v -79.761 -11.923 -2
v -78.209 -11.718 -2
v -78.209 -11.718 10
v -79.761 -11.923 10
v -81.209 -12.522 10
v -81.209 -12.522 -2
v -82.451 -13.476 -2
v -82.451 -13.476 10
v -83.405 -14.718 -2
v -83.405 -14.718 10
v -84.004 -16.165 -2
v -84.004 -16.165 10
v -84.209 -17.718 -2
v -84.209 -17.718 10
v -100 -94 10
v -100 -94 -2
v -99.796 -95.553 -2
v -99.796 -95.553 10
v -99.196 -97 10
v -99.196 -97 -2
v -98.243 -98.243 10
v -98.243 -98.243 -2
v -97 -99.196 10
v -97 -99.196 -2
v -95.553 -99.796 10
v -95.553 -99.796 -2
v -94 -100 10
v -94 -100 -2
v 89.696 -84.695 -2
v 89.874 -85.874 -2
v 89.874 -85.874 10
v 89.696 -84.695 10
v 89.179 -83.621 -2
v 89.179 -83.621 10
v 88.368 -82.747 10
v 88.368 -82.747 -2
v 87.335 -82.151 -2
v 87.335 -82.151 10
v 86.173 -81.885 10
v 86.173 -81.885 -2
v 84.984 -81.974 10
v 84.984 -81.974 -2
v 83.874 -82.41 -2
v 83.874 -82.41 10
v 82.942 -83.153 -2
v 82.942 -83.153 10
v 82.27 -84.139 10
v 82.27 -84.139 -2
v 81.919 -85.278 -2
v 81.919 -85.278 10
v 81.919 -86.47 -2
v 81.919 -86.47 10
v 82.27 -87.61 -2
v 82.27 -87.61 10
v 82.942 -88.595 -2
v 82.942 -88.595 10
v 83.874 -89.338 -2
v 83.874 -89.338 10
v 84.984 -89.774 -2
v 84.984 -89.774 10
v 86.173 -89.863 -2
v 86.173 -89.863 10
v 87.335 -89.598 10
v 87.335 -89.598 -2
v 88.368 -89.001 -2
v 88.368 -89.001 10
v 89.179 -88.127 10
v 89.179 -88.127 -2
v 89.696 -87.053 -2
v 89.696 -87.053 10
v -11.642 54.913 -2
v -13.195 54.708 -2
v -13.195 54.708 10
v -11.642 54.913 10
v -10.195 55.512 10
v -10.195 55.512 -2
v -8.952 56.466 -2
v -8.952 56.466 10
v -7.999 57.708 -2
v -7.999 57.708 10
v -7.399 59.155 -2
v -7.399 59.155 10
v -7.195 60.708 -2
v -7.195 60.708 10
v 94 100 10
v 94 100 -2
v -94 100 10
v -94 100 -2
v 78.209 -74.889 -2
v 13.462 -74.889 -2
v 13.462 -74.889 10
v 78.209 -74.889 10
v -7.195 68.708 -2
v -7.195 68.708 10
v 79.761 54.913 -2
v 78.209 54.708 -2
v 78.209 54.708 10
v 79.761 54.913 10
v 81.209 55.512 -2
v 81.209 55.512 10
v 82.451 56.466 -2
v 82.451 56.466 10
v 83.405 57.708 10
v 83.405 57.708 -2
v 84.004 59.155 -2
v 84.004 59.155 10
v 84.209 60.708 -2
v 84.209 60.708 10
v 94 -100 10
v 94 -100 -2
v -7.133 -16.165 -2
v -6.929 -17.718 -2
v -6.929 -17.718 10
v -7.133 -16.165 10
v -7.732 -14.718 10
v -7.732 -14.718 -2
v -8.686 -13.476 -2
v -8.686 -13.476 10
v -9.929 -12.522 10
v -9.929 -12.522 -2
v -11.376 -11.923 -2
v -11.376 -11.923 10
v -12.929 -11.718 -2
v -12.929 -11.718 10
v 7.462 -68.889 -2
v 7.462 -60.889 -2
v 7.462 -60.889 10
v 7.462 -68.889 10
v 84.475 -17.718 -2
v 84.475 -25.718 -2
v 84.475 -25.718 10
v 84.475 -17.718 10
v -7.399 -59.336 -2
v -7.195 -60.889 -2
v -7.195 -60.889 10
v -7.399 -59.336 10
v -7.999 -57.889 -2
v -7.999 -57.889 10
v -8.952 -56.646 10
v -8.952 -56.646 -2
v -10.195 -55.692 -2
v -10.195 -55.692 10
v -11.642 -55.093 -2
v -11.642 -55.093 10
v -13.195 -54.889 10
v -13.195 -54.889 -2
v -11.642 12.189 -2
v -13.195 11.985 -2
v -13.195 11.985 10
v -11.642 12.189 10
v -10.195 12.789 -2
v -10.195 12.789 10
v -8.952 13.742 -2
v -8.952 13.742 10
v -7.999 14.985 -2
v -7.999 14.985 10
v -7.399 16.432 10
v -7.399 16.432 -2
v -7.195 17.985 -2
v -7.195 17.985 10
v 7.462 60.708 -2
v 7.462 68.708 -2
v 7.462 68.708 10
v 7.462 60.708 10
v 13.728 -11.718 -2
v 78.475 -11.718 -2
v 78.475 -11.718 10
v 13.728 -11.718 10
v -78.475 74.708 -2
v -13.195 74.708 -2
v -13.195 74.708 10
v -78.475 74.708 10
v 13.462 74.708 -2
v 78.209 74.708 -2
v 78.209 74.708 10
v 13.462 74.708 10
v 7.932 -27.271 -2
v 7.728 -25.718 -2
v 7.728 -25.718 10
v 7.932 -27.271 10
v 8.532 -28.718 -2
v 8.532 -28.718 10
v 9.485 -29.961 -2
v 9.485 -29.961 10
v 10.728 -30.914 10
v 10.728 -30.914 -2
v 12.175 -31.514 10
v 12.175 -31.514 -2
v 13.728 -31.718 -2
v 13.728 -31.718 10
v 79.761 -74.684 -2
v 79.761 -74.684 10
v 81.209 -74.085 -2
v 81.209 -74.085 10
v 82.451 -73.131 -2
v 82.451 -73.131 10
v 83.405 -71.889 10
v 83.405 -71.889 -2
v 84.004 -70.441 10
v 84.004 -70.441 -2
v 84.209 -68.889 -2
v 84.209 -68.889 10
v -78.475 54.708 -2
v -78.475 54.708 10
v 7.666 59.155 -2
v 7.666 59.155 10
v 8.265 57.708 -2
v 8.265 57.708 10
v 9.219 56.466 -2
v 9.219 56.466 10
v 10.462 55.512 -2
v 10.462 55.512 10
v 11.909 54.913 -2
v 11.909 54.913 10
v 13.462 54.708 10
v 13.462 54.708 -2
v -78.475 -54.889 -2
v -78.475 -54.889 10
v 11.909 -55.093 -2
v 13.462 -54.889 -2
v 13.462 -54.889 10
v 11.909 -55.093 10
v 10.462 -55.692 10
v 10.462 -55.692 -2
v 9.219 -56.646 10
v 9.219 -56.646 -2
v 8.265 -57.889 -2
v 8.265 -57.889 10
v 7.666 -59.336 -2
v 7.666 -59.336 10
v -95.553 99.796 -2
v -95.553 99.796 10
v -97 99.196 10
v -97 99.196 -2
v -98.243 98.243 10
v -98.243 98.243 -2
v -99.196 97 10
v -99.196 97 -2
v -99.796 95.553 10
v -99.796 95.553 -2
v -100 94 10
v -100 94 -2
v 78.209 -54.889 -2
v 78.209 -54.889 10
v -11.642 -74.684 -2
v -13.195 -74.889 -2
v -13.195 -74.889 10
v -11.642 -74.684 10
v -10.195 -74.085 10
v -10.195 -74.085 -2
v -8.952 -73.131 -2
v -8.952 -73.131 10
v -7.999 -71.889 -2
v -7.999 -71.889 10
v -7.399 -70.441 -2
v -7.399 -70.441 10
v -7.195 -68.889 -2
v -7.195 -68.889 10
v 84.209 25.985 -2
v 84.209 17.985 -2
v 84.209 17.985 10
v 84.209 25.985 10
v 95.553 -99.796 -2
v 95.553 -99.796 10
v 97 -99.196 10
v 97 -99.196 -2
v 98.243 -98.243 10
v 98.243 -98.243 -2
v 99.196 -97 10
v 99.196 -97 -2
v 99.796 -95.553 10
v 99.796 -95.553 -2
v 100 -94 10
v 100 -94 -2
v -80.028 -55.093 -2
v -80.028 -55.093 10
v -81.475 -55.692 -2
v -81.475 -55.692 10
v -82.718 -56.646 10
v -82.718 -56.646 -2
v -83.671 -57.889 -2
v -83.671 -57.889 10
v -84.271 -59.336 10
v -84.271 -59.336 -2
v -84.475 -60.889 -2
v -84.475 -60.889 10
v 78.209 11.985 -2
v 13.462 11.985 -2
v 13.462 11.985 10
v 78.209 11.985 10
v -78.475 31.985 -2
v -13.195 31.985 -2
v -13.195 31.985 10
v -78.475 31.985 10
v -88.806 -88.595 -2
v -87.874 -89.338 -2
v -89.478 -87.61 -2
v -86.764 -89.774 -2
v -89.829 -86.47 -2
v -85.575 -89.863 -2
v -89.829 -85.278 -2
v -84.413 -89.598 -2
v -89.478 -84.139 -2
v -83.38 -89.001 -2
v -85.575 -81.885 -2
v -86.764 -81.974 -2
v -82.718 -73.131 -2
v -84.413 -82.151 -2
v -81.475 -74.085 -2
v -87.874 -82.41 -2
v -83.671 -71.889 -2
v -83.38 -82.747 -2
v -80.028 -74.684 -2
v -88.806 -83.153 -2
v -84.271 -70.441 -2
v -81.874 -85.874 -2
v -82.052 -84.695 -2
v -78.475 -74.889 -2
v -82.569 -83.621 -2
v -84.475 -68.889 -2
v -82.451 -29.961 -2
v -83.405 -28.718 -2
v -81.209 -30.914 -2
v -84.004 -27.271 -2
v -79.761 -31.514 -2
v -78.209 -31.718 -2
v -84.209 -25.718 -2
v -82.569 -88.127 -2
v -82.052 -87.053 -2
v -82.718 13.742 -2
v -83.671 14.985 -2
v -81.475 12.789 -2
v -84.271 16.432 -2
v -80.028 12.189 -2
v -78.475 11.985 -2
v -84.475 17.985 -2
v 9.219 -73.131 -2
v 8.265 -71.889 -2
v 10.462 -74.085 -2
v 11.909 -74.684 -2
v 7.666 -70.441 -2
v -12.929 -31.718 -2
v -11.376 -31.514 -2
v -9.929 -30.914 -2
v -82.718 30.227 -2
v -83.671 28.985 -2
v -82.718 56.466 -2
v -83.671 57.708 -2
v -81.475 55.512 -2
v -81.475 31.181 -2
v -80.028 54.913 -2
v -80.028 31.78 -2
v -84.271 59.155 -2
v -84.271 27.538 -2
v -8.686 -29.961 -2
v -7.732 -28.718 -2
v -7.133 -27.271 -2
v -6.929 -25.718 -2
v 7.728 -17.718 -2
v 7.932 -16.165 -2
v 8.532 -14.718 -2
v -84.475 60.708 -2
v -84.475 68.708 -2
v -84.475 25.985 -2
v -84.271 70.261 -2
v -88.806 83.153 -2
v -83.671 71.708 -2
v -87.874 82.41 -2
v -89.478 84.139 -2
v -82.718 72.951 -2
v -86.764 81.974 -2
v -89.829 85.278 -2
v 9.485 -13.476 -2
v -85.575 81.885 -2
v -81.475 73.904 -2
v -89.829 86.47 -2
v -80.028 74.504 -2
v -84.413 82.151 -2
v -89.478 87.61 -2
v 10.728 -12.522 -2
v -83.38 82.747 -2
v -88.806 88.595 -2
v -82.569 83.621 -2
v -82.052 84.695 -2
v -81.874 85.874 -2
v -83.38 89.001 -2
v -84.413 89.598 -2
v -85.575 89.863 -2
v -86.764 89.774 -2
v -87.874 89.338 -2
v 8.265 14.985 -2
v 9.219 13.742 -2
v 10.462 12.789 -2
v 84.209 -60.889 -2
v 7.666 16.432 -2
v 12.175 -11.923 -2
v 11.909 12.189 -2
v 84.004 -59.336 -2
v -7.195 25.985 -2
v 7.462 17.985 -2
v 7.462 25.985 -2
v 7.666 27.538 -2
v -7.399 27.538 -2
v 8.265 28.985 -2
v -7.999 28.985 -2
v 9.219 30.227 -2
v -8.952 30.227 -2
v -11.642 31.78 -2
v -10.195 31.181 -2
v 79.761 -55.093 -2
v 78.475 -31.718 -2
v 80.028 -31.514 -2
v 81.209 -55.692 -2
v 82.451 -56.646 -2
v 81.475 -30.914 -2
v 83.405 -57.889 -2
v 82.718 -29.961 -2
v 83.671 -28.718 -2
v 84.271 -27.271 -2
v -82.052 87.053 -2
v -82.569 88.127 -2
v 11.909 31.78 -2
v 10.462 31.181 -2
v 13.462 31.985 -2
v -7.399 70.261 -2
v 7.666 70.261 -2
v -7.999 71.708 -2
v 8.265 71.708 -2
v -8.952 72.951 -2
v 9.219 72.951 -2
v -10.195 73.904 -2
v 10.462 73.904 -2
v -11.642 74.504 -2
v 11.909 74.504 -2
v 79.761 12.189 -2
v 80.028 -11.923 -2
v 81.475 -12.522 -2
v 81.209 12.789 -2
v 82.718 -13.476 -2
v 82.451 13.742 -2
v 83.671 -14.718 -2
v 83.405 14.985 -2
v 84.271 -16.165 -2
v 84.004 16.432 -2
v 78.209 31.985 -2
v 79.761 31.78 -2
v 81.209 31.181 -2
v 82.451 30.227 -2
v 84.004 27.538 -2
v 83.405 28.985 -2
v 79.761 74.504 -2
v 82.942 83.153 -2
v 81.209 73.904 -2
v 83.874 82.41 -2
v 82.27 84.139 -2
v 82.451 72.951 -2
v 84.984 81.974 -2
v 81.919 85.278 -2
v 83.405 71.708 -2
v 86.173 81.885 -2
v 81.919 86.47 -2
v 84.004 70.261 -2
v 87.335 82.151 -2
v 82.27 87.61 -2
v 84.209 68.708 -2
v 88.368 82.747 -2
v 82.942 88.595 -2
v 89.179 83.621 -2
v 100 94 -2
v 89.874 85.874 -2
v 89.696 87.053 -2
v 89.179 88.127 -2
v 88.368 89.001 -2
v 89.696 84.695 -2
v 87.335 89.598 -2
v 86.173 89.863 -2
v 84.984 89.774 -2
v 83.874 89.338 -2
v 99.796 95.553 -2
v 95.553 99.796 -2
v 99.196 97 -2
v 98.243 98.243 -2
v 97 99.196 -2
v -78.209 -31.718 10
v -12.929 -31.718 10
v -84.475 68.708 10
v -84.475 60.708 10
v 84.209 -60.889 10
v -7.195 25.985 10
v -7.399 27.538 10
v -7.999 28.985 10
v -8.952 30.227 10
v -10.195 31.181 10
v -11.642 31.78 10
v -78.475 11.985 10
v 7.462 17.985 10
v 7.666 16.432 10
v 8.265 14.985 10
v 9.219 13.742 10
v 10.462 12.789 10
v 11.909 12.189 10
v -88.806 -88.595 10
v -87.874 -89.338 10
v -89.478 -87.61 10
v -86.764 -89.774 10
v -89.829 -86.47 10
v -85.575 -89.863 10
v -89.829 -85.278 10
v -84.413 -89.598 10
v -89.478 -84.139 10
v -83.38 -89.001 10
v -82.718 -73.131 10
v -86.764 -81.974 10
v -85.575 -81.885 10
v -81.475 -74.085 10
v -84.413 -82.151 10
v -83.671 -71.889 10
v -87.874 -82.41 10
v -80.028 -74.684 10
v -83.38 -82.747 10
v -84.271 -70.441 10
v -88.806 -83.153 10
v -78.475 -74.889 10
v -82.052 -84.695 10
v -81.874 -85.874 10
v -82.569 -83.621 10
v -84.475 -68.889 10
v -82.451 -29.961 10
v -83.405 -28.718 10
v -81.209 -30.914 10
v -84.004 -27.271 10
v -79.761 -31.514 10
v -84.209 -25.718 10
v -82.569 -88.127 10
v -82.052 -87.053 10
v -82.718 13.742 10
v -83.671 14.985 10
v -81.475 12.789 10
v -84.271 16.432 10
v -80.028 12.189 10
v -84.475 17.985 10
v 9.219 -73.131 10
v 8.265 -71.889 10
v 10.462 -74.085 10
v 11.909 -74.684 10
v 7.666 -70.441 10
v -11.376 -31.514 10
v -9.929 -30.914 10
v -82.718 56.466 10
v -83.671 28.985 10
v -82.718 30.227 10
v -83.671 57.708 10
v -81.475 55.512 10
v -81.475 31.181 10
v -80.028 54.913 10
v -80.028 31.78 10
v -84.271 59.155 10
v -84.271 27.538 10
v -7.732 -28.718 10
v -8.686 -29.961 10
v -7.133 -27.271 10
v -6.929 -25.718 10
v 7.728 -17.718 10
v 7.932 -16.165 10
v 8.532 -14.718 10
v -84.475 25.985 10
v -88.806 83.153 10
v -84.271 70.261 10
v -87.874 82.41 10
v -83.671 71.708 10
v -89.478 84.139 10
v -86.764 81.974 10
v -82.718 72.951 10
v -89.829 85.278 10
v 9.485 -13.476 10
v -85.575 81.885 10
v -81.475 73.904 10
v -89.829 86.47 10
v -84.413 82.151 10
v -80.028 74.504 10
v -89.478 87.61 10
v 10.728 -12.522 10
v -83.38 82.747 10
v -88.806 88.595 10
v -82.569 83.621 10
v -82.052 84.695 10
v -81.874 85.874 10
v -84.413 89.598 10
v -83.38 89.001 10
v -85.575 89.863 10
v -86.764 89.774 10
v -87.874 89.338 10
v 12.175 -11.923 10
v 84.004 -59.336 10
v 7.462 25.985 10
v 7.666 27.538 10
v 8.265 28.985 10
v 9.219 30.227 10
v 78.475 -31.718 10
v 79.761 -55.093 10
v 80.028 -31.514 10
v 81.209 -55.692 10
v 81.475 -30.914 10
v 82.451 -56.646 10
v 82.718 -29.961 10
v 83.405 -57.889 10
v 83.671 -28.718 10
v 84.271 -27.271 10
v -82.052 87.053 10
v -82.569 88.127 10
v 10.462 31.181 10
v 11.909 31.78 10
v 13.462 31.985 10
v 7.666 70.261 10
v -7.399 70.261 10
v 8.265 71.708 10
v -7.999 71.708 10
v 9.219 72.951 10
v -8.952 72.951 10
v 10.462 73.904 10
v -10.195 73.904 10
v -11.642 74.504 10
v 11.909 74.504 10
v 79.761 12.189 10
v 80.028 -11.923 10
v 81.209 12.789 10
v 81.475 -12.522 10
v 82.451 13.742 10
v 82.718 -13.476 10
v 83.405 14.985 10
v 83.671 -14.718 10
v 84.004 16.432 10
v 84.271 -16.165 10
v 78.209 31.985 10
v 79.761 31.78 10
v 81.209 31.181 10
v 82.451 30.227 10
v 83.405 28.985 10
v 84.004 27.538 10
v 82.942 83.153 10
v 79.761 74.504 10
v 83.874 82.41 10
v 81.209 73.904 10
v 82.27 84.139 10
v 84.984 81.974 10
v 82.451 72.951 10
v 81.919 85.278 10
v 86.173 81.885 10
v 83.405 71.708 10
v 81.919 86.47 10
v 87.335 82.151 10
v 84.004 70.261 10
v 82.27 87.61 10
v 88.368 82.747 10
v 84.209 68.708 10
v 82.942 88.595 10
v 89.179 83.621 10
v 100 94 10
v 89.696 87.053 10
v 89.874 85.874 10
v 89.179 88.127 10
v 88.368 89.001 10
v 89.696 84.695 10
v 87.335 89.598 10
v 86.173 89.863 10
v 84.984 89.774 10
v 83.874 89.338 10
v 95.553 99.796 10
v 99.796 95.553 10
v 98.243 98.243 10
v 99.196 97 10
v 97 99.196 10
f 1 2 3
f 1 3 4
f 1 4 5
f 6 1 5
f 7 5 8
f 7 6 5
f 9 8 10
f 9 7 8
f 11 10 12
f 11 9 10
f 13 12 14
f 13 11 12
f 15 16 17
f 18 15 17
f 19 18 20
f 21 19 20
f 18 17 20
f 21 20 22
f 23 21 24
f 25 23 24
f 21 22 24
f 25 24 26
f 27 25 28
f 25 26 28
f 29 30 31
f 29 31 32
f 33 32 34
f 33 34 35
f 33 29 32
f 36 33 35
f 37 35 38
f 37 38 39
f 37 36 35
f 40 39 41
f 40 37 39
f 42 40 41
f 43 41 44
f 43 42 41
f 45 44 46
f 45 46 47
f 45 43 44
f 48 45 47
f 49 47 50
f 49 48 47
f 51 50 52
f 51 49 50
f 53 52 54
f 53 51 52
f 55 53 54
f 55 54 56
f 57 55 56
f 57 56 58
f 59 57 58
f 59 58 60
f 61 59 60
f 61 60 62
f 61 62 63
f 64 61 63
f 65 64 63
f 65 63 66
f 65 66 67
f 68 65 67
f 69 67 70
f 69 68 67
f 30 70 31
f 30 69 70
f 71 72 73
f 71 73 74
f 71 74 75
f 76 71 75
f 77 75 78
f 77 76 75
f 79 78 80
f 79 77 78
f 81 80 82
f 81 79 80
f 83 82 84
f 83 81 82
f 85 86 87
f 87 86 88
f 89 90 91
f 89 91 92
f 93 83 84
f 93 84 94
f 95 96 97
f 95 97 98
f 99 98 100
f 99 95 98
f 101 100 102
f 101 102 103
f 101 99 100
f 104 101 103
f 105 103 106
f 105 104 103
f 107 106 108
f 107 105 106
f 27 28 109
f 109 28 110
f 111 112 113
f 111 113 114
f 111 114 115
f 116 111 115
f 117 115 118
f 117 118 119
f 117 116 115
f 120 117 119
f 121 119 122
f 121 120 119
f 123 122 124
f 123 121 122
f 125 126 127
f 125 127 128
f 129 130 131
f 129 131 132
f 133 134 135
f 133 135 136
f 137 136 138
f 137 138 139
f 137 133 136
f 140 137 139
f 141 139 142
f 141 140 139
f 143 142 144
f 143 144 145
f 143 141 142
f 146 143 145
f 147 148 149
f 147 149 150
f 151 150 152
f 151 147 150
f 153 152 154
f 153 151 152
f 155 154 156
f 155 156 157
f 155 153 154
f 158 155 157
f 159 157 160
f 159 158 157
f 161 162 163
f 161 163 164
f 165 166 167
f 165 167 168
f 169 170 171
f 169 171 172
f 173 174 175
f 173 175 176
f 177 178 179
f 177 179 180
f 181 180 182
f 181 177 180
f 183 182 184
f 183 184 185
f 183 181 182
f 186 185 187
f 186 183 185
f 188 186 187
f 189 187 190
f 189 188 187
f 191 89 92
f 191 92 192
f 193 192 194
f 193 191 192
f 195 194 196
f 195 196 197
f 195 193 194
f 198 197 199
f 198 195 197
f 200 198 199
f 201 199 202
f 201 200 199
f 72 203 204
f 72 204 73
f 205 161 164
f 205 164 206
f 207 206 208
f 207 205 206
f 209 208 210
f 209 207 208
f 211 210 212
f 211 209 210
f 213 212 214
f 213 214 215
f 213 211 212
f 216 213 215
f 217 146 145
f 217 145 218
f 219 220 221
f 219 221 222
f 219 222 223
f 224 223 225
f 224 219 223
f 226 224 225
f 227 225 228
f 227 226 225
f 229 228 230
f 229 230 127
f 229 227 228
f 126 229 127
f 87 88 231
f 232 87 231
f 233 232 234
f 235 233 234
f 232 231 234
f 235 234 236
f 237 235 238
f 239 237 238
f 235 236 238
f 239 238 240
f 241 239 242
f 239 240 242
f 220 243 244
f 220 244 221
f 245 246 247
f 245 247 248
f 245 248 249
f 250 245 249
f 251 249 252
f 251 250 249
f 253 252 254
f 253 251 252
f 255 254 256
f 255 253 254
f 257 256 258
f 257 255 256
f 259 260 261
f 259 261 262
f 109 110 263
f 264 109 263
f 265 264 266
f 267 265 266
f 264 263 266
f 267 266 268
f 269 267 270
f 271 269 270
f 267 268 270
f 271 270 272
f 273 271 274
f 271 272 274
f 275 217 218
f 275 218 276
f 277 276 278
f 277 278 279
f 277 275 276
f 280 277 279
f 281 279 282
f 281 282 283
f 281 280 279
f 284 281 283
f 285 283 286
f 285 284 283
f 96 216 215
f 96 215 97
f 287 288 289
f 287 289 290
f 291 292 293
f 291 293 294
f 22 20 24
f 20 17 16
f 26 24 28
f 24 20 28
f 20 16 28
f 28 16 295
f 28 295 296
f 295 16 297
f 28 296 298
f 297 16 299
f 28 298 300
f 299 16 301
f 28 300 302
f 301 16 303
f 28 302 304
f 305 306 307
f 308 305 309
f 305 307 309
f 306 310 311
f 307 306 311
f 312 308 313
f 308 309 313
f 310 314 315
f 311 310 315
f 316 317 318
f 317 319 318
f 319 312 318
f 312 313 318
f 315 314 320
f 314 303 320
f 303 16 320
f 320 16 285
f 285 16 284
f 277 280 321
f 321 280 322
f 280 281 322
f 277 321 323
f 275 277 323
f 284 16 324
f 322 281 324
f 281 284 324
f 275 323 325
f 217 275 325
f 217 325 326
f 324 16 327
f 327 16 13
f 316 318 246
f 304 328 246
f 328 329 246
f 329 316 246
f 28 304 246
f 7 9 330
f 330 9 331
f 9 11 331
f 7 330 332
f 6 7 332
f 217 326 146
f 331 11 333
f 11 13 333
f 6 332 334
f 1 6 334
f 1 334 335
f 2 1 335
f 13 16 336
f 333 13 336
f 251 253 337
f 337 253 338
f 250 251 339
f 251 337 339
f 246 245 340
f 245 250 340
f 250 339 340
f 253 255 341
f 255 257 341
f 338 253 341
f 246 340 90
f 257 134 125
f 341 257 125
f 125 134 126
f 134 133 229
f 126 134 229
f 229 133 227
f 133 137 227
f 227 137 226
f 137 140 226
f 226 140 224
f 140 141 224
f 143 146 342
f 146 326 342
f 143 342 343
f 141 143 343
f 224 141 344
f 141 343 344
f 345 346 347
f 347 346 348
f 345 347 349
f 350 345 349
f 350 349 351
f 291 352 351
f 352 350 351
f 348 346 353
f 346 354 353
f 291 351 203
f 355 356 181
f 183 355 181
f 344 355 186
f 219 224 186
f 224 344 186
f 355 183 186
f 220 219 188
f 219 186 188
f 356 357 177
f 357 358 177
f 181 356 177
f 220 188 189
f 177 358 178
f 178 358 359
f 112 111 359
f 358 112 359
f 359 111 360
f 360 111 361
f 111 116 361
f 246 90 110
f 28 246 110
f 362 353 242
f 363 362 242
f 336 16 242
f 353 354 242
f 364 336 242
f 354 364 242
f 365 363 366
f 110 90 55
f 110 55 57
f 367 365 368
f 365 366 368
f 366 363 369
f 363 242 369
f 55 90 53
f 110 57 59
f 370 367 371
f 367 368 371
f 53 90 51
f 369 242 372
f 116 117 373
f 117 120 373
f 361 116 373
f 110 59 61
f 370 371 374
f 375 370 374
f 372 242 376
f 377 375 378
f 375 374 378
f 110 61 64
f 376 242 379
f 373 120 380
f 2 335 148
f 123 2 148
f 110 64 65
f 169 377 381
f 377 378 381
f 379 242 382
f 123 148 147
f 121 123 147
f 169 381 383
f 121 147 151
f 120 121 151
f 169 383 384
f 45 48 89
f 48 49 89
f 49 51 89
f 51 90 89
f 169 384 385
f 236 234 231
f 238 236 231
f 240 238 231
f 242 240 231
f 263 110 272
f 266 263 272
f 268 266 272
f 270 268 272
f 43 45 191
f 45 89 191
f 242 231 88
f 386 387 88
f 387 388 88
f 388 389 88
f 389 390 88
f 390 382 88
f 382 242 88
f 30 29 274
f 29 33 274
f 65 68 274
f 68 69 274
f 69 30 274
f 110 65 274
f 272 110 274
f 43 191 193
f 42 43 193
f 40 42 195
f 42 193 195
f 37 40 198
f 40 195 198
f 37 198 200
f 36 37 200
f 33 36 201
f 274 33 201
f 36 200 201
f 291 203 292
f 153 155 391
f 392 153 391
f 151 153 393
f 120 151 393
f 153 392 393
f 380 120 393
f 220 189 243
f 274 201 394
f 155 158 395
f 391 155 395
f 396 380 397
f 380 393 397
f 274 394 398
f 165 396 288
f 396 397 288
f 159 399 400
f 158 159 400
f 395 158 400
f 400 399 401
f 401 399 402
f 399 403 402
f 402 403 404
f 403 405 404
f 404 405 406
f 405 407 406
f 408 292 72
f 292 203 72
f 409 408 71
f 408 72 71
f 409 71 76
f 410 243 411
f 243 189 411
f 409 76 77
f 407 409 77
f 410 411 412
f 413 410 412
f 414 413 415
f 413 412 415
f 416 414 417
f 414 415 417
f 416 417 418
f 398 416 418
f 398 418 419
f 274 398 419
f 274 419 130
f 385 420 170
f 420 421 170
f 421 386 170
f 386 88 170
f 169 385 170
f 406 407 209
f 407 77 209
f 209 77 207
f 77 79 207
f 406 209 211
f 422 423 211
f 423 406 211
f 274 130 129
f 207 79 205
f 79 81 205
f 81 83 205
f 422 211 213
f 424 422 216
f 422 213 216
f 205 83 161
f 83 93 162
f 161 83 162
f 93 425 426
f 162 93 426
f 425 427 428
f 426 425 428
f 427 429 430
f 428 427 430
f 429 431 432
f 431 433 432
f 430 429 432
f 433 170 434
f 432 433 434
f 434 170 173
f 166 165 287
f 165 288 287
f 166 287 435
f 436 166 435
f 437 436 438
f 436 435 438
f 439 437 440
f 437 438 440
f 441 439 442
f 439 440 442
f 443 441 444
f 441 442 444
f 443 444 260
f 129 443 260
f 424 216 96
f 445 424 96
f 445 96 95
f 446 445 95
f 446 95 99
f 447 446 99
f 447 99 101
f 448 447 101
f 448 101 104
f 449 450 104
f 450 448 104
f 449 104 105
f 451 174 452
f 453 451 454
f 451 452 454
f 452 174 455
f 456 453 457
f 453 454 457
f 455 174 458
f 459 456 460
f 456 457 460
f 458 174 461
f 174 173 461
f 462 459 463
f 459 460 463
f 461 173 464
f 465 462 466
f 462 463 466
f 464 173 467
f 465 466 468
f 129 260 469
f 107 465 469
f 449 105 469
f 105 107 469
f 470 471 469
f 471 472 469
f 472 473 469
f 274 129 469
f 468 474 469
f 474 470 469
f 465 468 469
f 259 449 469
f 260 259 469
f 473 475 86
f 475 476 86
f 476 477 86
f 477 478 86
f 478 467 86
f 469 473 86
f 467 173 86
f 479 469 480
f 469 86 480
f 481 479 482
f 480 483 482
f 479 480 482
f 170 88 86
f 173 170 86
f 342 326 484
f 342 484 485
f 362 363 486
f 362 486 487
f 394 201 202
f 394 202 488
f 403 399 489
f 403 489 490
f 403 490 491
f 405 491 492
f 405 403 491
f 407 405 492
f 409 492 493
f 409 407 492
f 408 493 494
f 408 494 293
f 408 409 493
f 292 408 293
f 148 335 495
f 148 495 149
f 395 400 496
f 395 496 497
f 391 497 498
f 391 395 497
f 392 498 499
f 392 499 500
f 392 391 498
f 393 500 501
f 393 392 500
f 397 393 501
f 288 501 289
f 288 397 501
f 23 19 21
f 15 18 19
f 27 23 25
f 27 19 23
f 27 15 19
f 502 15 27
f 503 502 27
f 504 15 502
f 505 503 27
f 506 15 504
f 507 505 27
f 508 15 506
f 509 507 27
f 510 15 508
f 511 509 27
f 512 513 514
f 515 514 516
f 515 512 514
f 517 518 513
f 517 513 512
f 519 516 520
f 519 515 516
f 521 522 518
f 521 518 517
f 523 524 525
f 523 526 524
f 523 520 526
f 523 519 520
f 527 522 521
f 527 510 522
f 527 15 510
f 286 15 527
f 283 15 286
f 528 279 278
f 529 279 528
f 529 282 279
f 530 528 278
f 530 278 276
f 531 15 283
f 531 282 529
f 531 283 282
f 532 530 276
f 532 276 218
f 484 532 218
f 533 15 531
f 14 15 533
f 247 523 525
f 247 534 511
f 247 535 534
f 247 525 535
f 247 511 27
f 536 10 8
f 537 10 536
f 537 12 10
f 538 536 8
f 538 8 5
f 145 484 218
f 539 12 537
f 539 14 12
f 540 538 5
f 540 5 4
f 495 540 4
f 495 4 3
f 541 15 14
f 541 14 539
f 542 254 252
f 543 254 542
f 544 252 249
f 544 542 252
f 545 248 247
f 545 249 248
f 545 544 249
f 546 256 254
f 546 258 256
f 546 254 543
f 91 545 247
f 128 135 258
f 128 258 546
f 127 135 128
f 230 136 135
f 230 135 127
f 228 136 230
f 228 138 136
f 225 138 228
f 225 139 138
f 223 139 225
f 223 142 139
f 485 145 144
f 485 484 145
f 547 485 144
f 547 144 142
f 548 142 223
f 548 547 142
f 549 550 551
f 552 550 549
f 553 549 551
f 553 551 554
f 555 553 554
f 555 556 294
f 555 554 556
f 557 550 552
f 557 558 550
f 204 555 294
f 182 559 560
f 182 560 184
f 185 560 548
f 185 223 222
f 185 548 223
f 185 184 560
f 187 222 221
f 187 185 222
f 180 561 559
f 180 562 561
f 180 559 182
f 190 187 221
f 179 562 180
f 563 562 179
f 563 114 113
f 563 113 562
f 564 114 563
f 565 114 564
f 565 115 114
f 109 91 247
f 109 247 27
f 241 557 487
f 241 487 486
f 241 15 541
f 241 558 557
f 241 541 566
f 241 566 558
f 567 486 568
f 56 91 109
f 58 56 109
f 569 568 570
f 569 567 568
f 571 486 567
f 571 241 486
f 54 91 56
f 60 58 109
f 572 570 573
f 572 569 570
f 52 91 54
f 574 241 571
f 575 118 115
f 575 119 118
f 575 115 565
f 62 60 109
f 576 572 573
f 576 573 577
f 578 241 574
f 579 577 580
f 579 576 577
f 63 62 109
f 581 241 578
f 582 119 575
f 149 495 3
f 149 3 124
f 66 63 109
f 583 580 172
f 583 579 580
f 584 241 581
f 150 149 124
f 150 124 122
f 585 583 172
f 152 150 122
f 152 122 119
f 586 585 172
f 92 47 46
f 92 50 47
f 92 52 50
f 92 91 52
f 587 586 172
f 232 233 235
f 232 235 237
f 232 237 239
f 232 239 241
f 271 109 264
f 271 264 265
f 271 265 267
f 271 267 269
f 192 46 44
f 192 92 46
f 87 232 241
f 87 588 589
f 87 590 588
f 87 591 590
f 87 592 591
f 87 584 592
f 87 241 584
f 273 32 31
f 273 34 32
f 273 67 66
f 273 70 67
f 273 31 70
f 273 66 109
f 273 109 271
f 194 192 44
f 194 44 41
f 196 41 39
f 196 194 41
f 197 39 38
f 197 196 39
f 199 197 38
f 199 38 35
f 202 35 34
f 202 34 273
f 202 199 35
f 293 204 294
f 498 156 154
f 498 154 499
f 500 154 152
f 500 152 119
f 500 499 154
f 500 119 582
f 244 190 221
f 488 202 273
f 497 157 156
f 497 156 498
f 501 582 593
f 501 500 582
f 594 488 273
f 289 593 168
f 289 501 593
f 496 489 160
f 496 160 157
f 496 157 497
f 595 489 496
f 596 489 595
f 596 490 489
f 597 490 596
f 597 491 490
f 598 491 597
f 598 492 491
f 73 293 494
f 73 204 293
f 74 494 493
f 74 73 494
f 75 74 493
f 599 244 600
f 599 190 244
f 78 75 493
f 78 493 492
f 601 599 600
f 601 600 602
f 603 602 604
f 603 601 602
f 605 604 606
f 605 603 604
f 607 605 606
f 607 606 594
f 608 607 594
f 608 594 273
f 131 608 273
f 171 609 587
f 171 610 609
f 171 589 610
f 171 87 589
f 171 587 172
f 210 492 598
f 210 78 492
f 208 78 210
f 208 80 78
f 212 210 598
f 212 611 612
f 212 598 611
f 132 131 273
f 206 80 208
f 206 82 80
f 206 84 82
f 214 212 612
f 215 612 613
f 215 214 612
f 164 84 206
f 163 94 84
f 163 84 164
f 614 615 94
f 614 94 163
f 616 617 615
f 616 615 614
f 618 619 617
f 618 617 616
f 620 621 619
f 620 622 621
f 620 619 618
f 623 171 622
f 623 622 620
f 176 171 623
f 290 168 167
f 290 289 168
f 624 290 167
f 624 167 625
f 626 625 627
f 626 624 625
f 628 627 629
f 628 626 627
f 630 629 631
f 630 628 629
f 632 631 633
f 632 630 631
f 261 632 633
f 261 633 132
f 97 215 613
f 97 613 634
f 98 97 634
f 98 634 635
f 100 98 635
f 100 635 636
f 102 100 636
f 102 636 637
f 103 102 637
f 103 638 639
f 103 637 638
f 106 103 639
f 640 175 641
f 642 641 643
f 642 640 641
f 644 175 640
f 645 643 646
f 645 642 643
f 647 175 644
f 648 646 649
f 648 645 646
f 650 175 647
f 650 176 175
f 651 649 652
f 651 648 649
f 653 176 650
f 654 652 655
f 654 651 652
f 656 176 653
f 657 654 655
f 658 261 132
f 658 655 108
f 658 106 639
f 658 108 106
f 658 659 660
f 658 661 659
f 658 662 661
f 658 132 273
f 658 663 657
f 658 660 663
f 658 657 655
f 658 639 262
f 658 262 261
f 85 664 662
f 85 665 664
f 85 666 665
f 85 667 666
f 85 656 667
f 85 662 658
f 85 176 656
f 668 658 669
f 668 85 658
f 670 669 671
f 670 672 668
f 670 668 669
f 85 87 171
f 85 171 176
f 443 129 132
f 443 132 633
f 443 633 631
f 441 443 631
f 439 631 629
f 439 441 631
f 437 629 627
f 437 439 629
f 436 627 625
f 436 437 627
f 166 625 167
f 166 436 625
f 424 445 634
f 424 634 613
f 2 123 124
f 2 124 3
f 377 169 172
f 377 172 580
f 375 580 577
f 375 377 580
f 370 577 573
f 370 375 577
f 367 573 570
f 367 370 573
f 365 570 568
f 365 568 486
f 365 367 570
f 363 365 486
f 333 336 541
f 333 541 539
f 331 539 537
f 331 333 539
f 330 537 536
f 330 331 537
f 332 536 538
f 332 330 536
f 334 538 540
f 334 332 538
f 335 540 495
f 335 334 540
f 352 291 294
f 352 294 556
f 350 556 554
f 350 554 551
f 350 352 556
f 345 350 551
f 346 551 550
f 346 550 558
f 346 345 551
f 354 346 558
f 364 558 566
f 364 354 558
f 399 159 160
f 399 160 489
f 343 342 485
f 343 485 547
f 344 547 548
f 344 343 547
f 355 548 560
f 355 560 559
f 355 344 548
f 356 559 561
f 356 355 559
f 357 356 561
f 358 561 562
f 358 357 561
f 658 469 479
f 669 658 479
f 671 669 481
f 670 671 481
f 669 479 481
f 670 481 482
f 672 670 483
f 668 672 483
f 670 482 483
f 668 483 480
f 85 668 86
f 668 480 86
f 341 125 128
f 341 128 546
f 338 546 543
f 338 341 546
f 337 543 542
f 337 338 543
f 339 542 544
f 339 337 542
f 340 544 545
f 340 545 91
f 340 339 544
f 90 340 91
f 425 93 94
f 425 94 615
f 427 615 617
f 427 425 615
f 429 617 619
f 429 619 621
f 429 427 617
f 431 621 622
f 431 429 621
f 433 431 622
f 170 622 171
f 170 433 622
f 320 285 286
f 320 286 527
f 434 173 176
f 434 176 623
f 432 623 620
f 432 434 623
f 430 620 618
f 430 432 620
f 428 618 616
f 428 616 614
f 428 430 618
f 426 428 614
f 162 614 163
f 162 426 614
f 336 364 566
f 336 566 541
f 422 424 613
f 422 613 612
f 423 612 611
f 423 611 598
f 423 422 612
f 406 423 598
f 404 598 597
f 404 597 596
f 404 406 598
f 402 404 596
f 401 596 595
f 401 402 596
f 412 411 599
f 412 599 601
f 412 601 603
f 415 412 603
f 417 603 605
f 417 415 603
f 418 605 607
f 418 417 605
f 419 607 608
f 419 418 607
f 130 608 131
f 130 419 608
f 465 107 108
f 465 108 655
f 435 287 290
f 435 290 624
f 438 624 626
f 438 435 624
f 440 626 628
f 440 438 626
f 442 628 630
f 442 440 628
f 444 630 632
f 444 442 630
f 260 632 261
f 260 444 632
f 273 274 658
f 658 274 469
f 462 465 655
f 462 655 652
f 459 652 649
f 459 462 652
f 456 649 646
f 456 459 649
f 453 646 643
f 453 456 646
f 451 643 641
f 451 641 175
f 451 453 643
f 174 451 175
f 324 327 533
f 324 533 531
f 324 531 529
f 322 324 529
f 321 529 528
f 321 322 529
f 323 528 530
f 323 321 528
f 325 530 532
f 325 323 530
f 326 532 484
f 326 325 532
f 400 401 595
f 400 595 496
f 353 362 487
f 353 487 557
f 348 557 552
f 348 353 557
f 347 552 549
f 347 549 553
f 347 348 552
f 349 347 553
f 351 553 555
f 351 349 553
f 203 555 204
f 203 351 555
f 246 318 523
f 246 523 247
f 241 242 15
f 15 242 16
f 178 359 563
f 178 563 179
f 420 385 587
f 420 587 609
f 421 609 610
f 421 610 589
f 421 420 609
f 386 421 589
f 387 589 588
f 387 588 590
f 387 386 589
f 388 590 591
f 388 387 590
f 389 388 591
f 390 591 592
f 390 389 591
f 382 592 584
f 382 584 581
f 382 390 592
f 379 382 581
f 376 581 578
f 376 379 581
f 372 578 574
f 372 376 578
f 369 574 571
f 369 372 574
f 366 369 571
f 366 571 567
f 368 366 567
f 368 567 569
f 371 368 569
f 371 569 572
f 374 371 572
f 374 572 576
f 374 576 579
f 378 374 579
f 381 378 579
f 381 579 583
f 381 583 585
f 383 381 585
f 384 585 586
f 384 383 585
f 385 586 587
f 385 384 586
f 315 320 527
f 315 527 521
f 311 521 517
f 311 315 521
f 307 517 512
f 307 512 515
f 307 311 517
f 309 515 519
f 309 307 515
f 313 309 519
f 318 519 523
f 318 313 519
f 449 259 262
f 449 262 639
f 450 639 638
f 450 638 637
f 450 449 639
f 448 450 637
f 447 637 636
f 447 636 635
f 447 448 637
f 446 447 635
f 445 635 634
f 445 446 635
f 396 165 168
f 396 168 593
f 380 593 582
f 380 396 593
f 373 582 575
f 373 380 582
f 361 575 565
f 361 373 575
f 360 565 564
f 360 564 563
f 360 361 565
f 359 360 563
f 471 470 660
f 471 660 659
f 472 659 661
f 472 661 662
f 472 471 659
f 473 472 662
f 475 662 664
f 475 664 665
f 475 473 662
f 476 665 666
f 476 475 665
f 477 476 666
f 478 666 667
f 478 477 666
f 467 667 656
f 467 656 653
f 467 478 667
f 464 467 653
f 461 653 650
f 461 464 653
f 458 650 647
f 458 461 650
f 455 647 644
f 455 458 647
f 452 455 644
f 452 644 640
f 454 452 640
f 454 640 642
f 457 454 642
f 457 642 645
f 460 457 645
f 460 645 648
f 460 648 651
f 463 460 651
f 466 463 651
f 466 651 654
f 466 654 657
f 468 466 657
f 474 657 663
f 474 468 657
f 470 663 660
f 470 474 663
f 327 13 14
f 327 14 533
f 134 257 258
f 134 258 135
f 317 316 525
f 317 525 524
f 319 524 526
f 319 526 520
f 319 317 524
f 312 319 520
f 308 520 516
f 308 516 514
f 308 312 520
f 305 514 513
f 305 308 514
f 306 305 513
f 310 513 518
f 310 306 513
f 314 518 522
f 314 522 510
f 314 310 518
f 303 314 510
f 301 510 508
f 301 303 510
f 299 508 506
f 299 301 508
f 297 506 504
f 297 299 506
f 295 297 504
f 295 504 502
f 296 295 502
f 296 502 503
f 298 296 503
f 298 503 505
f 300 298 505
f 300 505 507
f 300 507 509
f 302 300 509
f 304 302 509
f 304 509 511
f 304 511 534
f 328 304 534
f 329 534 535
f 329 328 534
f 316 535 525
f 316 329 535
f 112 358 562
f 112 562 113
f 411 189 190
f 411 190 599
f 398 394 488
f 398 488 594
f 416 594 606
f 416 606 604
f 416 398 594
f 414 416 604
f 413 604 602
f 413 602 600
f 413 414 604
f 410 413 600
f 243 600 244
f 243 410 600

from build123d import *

# Parameters (mm, degrees)
SALIENTE_EXTRUIR2_DEPTH      = 10
SALIENTE_EXTRUIR2_DEPTH_BACK = 2
CROQUIS1_R                   = 4


with BuildPart() as part:
    # Croquis1 → Saliente-Extruir2 (new, two sides: drawn at the far end of the back side and taken through both)
    with BuildSketch(Plane.XY.offset(-SALIENTE_EXTRUIR2_DEPTH_BACK)):
        with BuildLine():
            Line((-94, -100), (94, -100))
            ThreePointArc((94, -100), (98.242640687, -98.242640687), (100, -94))
            Line((100, -94), (100, 94))
            ThreePointArc((100, 94), (98.242640687, 98.242640687), (94, 100))
            Line((94, 100), (-94, 100))
            ThreePointArc((-94, 100), (-98.242640687, 98.242640687), (-100, 94))
            Line((-100, 94), (-100, -94))
            ThreePointArc((-100, -94), (-98.242640687, -98.242640687), (-94, -100))
        make_face()
        with Locations((-85.874076582, 85.874076582)):
            Circle(CROQUIS1_R, mode=Mode.SUBTRACT)
        with Locations((85.874076582, 85.874076582)):
            Circle(CROQUIS1_R, mode=Mode.SUBTRACT)
        with Locations((85.874076582, -85.874076582)):
            Circle(CROQUIS1_R, mode=Mode.SUBTRACT)
        with Locations((-85.874076582, -85.874076582)):
            Circle(CROQUIS1_R, mode=Mode.SUBTRACT)
        with BuildLine():
            Line((-78.475041975, 54.708172492), (-13.195035121, 54.708172492))
            ThreePointArc((-13.195035121, 54.708172492), (-8.952394434, 56.465531805), (-7.195035121, 60.708172492))
            Line((-7.195035121, 60.708172492), (-7.195035121, 68.708172492))
            ThreePointArc((-7.195035121, 68.708172492), (-8.952394434, 72.95081318), (-13.195035121, 74.708172492))
            Line((-13.195035121, 74.708172492), (-78.475041975, 74.708172492))
            ThreePointArc((-78.475041975, 74.708172492), (-82.717682662, 72.95081318), (-84.475041975, 68.708172492))
            Line((-84.475041975, 68.708172492), (-84.475041975, 60.708172492))
            ThreePointArc((-84.475041975, 60.708172492), (-82.717682662, 56.465531805), (-78.475041975, 54.708172492))
        make_face(mode=Mode.SUBTRACT)
        with BuildLine():
            Line((-78.475041975, 11.984829536), (-13.195035121, 11.984829536))
            ThreePointArc((-13.195035121, 11.984829536), (-8.952394434, 13.742188849), (-7.195035121, 17.984829536))
            Line((-7.195035121, 17.984829536), (-7.195035121, 25.984829536))
            ThreePointArc((-7.195035121, 25.984829536), (-8.952394434, 30.227470223), (-13.195035121, 31.984829536))
            Line((-13.195035121, 31.984829536), (-78.475041975, 31.984829536))
            ThreePointArc((-78.475041975, 31.984829536), (-82.717682662, 30.227470223), (-84.475041975, 25.984829536))
            Line((-84.475041975, 25.984829536), (-84.475041975, 17.984829536))
            ThreePointArc((-84.475041975, 17.984829536), (-82.717682662, 13.742188849), (-78.475041975, 11.984829536))
        make_face(mode=Mode.SUBTRACT)
        with BuildLine():
            Line((-78.208559193, -31.718346754), (-12.928552339, -31.718346754))
            ThreePointArc((-12.928552339, -31.718346754), (-8.685911652, -29.960987441), (-6.928552339, -25.718346754))
            Line((-6.928552339, -25.718346754), (-6.928552339, -17.718346754))
            ThreePointArc((-6.928552339, -17.718346754), (-8.685911652, -13.475706067), (-12.928552339, -11.718346754))
            Line((-12.928552339, -11.718346754), (-78.208559193, -11.718346754))
            ThreePointArc((-78.208559193, -11.718346754), (-82.45119988, -13.475706067), (-84.208559193, -17.718346754))
            Line((-84.208559193, -17.718346754), (-84.208559193, -25.718346754))
            ThreePointArc((-84.208559193, -25.718346754), (-82.45119988, -29.960987441), (-78.208559193, -31.718346754))
        make_face(mode=Mode.SUBTRACT)
        with BuildLine():
            Line((-78.475041975, -74.888557479), (-13.195035121, -74.888557479))
            ThreePointArc((-13.195035121, -74.888557479), (-8.952394434, -73.131198166), (-7.195035121, -68.888557479))
            Line((-7.195035121, -68.888557479), (-7.195035121, -60.888557479))
            ThreePointArc((-7.195035121, -60.888557479), (-8.952394434, -56.645916792), (-13.195035121, -54.888557479))
            Line((-13.195035121, -54.888557479), (-78.475041975, -54.888557479))
            ThreePointArc((-78.475041975, -54.888557479), (-82.717682662, -56.645916792), (-84.475041975, -60.888557479))
            Line((-84.475041975, -60.888557479), (-84.475041975, -68.888557479))
            ThreePointArc((-84.475041975, -68.888557479), (-82.717682662, -73.131198166), (-78.475041975, -74.888557479))
        make_face(mode=Mode.SUBTRACT)
        with BuildLine():
            Line((13.461517903, 11.984829536), (78.208559193, 11.984829536))
            ThreePointArc((78.208559193, 11.984829536), (82.45119988, 13.742188849), (84.208559193, 17.984829536))
            Line((84.208559193, 17.984829536), (84.208559193, 25.984829536))
            ThreePointArc((84.208559193, 25.984829536), (82.45119988, 30.227470223), (78.208559193, 31.984829536))
            Line((78.208559193, 31.984829536), (13.461517903, 31.984829536))
            ThreePointArc((13.461517903, 31.984829536), (9.218877216, 30.227470223), (7.461517903, 25.984829536))
            Line((7.461517903, 25.984829536), (7.461517903, 17.984829536))
            ThreePointArc((7.461517903, 17.984829536), (9.218877216, 13.742188849), (13.461517903, 11.984829536))
        make_face(mode=Mode.SUBTRACT)
        with BuildLine():
            Line((13.461517903, 54.708172492), (78.208559193, 54.708172492))
            ThreePointArc((78.208559193, 54.708172492), (82.45119988, 56.465531805), (84.208559193, 60.708172492))
            Line((84.208559193, 60.708172492), (84.208559193, 68.708172492))
            ThreePointArc((84.208559193, 68.708172492), (82.45119988, 72.95081318), (78.208559193, 74.708172492))
            Line((78.208559193, 74.708172492), (13.461517903, 74.708172492))
            ThreePointArc((13.461517903, 74.708172492), (9.218877216, 72.95081318), (7.461517903, 68.708172492))
            Line((7.461517903, 68.708172492), (7.461517903, 60.708172492))
            ThreePointArc((7.461517903, 60.708172492), (9.218877216, 56.465531805), (13.461517903, 54.708172492))
        make_face(mode=Mode.SUBTRACT)
        with BuildLine():
            Line((13.728000685, -31.718346754), (78.475041975, -31.718346754))
            ThreePointArc((78.475041975, -31.718346754), (82.717682662, -29.960987441), (84.475041975, -25.718346754))
            Line((84.475041975, -25.718346754), (84.475041975, -17.718346754))
            ThreePointArc((84.475041975, -17.718346754), (82.717682662, -13.475706067), (78.475041975, -11.718346754))
            Line((78.475041975, -11.718346754), (13.728000685, -11.718346754))
            ThreePointArc((13.728000685, -11.718346754), (9.485359998, -13.475706067), (7.728000685, -17.718346754))
            Line((7.728000685, -17.718346754), (7.728000685, -25.718346754))
            ThreePointArc((7.728000685, -25.718346754), (9.485359998, -29.960987441), (13.728000685, -31.718346754))
        make_face(mode=Mode.SUBTRACT)
        with BuildLine():
            Line((13.461517903, -74.888557479), (78.208559193, -74.888557479))
            ThreePointArc((78.208559193, -74.888557479), (82.45119988, -73.131198166), (84.208559193, -68.888557479))
            Line((84.208559193, -68.888557479), (84.208559193, -60.888557479))
            ThreePointArc((84.208559193, -60.888557479), (82.45119988, -56.645916792), (78.208559193, -54.888557479))
            Line((78.208559193, -54.888557479), (13.461517903, -54.888557479))
            ThreePointArc((13.461517903, -54.888557479), (9.218877216, -56.645916792), (7.461517903, -60.888557479))
            Line((7.461517903, -60.888557479), (7.461517903, -68.888557479))
            ThreePointArc((7.461517903, -68.888557479), (9.218877216, -73.131198166), (13.461517903, -74.888557479))
        make_face(mode=Mode.SUBTRACT)
    extrude(amount=SALIENTE_EXTRUIR2_DEPTH + SALIENTE_EXTRUIR2_DEPTH_BACK)


solid = part.part
